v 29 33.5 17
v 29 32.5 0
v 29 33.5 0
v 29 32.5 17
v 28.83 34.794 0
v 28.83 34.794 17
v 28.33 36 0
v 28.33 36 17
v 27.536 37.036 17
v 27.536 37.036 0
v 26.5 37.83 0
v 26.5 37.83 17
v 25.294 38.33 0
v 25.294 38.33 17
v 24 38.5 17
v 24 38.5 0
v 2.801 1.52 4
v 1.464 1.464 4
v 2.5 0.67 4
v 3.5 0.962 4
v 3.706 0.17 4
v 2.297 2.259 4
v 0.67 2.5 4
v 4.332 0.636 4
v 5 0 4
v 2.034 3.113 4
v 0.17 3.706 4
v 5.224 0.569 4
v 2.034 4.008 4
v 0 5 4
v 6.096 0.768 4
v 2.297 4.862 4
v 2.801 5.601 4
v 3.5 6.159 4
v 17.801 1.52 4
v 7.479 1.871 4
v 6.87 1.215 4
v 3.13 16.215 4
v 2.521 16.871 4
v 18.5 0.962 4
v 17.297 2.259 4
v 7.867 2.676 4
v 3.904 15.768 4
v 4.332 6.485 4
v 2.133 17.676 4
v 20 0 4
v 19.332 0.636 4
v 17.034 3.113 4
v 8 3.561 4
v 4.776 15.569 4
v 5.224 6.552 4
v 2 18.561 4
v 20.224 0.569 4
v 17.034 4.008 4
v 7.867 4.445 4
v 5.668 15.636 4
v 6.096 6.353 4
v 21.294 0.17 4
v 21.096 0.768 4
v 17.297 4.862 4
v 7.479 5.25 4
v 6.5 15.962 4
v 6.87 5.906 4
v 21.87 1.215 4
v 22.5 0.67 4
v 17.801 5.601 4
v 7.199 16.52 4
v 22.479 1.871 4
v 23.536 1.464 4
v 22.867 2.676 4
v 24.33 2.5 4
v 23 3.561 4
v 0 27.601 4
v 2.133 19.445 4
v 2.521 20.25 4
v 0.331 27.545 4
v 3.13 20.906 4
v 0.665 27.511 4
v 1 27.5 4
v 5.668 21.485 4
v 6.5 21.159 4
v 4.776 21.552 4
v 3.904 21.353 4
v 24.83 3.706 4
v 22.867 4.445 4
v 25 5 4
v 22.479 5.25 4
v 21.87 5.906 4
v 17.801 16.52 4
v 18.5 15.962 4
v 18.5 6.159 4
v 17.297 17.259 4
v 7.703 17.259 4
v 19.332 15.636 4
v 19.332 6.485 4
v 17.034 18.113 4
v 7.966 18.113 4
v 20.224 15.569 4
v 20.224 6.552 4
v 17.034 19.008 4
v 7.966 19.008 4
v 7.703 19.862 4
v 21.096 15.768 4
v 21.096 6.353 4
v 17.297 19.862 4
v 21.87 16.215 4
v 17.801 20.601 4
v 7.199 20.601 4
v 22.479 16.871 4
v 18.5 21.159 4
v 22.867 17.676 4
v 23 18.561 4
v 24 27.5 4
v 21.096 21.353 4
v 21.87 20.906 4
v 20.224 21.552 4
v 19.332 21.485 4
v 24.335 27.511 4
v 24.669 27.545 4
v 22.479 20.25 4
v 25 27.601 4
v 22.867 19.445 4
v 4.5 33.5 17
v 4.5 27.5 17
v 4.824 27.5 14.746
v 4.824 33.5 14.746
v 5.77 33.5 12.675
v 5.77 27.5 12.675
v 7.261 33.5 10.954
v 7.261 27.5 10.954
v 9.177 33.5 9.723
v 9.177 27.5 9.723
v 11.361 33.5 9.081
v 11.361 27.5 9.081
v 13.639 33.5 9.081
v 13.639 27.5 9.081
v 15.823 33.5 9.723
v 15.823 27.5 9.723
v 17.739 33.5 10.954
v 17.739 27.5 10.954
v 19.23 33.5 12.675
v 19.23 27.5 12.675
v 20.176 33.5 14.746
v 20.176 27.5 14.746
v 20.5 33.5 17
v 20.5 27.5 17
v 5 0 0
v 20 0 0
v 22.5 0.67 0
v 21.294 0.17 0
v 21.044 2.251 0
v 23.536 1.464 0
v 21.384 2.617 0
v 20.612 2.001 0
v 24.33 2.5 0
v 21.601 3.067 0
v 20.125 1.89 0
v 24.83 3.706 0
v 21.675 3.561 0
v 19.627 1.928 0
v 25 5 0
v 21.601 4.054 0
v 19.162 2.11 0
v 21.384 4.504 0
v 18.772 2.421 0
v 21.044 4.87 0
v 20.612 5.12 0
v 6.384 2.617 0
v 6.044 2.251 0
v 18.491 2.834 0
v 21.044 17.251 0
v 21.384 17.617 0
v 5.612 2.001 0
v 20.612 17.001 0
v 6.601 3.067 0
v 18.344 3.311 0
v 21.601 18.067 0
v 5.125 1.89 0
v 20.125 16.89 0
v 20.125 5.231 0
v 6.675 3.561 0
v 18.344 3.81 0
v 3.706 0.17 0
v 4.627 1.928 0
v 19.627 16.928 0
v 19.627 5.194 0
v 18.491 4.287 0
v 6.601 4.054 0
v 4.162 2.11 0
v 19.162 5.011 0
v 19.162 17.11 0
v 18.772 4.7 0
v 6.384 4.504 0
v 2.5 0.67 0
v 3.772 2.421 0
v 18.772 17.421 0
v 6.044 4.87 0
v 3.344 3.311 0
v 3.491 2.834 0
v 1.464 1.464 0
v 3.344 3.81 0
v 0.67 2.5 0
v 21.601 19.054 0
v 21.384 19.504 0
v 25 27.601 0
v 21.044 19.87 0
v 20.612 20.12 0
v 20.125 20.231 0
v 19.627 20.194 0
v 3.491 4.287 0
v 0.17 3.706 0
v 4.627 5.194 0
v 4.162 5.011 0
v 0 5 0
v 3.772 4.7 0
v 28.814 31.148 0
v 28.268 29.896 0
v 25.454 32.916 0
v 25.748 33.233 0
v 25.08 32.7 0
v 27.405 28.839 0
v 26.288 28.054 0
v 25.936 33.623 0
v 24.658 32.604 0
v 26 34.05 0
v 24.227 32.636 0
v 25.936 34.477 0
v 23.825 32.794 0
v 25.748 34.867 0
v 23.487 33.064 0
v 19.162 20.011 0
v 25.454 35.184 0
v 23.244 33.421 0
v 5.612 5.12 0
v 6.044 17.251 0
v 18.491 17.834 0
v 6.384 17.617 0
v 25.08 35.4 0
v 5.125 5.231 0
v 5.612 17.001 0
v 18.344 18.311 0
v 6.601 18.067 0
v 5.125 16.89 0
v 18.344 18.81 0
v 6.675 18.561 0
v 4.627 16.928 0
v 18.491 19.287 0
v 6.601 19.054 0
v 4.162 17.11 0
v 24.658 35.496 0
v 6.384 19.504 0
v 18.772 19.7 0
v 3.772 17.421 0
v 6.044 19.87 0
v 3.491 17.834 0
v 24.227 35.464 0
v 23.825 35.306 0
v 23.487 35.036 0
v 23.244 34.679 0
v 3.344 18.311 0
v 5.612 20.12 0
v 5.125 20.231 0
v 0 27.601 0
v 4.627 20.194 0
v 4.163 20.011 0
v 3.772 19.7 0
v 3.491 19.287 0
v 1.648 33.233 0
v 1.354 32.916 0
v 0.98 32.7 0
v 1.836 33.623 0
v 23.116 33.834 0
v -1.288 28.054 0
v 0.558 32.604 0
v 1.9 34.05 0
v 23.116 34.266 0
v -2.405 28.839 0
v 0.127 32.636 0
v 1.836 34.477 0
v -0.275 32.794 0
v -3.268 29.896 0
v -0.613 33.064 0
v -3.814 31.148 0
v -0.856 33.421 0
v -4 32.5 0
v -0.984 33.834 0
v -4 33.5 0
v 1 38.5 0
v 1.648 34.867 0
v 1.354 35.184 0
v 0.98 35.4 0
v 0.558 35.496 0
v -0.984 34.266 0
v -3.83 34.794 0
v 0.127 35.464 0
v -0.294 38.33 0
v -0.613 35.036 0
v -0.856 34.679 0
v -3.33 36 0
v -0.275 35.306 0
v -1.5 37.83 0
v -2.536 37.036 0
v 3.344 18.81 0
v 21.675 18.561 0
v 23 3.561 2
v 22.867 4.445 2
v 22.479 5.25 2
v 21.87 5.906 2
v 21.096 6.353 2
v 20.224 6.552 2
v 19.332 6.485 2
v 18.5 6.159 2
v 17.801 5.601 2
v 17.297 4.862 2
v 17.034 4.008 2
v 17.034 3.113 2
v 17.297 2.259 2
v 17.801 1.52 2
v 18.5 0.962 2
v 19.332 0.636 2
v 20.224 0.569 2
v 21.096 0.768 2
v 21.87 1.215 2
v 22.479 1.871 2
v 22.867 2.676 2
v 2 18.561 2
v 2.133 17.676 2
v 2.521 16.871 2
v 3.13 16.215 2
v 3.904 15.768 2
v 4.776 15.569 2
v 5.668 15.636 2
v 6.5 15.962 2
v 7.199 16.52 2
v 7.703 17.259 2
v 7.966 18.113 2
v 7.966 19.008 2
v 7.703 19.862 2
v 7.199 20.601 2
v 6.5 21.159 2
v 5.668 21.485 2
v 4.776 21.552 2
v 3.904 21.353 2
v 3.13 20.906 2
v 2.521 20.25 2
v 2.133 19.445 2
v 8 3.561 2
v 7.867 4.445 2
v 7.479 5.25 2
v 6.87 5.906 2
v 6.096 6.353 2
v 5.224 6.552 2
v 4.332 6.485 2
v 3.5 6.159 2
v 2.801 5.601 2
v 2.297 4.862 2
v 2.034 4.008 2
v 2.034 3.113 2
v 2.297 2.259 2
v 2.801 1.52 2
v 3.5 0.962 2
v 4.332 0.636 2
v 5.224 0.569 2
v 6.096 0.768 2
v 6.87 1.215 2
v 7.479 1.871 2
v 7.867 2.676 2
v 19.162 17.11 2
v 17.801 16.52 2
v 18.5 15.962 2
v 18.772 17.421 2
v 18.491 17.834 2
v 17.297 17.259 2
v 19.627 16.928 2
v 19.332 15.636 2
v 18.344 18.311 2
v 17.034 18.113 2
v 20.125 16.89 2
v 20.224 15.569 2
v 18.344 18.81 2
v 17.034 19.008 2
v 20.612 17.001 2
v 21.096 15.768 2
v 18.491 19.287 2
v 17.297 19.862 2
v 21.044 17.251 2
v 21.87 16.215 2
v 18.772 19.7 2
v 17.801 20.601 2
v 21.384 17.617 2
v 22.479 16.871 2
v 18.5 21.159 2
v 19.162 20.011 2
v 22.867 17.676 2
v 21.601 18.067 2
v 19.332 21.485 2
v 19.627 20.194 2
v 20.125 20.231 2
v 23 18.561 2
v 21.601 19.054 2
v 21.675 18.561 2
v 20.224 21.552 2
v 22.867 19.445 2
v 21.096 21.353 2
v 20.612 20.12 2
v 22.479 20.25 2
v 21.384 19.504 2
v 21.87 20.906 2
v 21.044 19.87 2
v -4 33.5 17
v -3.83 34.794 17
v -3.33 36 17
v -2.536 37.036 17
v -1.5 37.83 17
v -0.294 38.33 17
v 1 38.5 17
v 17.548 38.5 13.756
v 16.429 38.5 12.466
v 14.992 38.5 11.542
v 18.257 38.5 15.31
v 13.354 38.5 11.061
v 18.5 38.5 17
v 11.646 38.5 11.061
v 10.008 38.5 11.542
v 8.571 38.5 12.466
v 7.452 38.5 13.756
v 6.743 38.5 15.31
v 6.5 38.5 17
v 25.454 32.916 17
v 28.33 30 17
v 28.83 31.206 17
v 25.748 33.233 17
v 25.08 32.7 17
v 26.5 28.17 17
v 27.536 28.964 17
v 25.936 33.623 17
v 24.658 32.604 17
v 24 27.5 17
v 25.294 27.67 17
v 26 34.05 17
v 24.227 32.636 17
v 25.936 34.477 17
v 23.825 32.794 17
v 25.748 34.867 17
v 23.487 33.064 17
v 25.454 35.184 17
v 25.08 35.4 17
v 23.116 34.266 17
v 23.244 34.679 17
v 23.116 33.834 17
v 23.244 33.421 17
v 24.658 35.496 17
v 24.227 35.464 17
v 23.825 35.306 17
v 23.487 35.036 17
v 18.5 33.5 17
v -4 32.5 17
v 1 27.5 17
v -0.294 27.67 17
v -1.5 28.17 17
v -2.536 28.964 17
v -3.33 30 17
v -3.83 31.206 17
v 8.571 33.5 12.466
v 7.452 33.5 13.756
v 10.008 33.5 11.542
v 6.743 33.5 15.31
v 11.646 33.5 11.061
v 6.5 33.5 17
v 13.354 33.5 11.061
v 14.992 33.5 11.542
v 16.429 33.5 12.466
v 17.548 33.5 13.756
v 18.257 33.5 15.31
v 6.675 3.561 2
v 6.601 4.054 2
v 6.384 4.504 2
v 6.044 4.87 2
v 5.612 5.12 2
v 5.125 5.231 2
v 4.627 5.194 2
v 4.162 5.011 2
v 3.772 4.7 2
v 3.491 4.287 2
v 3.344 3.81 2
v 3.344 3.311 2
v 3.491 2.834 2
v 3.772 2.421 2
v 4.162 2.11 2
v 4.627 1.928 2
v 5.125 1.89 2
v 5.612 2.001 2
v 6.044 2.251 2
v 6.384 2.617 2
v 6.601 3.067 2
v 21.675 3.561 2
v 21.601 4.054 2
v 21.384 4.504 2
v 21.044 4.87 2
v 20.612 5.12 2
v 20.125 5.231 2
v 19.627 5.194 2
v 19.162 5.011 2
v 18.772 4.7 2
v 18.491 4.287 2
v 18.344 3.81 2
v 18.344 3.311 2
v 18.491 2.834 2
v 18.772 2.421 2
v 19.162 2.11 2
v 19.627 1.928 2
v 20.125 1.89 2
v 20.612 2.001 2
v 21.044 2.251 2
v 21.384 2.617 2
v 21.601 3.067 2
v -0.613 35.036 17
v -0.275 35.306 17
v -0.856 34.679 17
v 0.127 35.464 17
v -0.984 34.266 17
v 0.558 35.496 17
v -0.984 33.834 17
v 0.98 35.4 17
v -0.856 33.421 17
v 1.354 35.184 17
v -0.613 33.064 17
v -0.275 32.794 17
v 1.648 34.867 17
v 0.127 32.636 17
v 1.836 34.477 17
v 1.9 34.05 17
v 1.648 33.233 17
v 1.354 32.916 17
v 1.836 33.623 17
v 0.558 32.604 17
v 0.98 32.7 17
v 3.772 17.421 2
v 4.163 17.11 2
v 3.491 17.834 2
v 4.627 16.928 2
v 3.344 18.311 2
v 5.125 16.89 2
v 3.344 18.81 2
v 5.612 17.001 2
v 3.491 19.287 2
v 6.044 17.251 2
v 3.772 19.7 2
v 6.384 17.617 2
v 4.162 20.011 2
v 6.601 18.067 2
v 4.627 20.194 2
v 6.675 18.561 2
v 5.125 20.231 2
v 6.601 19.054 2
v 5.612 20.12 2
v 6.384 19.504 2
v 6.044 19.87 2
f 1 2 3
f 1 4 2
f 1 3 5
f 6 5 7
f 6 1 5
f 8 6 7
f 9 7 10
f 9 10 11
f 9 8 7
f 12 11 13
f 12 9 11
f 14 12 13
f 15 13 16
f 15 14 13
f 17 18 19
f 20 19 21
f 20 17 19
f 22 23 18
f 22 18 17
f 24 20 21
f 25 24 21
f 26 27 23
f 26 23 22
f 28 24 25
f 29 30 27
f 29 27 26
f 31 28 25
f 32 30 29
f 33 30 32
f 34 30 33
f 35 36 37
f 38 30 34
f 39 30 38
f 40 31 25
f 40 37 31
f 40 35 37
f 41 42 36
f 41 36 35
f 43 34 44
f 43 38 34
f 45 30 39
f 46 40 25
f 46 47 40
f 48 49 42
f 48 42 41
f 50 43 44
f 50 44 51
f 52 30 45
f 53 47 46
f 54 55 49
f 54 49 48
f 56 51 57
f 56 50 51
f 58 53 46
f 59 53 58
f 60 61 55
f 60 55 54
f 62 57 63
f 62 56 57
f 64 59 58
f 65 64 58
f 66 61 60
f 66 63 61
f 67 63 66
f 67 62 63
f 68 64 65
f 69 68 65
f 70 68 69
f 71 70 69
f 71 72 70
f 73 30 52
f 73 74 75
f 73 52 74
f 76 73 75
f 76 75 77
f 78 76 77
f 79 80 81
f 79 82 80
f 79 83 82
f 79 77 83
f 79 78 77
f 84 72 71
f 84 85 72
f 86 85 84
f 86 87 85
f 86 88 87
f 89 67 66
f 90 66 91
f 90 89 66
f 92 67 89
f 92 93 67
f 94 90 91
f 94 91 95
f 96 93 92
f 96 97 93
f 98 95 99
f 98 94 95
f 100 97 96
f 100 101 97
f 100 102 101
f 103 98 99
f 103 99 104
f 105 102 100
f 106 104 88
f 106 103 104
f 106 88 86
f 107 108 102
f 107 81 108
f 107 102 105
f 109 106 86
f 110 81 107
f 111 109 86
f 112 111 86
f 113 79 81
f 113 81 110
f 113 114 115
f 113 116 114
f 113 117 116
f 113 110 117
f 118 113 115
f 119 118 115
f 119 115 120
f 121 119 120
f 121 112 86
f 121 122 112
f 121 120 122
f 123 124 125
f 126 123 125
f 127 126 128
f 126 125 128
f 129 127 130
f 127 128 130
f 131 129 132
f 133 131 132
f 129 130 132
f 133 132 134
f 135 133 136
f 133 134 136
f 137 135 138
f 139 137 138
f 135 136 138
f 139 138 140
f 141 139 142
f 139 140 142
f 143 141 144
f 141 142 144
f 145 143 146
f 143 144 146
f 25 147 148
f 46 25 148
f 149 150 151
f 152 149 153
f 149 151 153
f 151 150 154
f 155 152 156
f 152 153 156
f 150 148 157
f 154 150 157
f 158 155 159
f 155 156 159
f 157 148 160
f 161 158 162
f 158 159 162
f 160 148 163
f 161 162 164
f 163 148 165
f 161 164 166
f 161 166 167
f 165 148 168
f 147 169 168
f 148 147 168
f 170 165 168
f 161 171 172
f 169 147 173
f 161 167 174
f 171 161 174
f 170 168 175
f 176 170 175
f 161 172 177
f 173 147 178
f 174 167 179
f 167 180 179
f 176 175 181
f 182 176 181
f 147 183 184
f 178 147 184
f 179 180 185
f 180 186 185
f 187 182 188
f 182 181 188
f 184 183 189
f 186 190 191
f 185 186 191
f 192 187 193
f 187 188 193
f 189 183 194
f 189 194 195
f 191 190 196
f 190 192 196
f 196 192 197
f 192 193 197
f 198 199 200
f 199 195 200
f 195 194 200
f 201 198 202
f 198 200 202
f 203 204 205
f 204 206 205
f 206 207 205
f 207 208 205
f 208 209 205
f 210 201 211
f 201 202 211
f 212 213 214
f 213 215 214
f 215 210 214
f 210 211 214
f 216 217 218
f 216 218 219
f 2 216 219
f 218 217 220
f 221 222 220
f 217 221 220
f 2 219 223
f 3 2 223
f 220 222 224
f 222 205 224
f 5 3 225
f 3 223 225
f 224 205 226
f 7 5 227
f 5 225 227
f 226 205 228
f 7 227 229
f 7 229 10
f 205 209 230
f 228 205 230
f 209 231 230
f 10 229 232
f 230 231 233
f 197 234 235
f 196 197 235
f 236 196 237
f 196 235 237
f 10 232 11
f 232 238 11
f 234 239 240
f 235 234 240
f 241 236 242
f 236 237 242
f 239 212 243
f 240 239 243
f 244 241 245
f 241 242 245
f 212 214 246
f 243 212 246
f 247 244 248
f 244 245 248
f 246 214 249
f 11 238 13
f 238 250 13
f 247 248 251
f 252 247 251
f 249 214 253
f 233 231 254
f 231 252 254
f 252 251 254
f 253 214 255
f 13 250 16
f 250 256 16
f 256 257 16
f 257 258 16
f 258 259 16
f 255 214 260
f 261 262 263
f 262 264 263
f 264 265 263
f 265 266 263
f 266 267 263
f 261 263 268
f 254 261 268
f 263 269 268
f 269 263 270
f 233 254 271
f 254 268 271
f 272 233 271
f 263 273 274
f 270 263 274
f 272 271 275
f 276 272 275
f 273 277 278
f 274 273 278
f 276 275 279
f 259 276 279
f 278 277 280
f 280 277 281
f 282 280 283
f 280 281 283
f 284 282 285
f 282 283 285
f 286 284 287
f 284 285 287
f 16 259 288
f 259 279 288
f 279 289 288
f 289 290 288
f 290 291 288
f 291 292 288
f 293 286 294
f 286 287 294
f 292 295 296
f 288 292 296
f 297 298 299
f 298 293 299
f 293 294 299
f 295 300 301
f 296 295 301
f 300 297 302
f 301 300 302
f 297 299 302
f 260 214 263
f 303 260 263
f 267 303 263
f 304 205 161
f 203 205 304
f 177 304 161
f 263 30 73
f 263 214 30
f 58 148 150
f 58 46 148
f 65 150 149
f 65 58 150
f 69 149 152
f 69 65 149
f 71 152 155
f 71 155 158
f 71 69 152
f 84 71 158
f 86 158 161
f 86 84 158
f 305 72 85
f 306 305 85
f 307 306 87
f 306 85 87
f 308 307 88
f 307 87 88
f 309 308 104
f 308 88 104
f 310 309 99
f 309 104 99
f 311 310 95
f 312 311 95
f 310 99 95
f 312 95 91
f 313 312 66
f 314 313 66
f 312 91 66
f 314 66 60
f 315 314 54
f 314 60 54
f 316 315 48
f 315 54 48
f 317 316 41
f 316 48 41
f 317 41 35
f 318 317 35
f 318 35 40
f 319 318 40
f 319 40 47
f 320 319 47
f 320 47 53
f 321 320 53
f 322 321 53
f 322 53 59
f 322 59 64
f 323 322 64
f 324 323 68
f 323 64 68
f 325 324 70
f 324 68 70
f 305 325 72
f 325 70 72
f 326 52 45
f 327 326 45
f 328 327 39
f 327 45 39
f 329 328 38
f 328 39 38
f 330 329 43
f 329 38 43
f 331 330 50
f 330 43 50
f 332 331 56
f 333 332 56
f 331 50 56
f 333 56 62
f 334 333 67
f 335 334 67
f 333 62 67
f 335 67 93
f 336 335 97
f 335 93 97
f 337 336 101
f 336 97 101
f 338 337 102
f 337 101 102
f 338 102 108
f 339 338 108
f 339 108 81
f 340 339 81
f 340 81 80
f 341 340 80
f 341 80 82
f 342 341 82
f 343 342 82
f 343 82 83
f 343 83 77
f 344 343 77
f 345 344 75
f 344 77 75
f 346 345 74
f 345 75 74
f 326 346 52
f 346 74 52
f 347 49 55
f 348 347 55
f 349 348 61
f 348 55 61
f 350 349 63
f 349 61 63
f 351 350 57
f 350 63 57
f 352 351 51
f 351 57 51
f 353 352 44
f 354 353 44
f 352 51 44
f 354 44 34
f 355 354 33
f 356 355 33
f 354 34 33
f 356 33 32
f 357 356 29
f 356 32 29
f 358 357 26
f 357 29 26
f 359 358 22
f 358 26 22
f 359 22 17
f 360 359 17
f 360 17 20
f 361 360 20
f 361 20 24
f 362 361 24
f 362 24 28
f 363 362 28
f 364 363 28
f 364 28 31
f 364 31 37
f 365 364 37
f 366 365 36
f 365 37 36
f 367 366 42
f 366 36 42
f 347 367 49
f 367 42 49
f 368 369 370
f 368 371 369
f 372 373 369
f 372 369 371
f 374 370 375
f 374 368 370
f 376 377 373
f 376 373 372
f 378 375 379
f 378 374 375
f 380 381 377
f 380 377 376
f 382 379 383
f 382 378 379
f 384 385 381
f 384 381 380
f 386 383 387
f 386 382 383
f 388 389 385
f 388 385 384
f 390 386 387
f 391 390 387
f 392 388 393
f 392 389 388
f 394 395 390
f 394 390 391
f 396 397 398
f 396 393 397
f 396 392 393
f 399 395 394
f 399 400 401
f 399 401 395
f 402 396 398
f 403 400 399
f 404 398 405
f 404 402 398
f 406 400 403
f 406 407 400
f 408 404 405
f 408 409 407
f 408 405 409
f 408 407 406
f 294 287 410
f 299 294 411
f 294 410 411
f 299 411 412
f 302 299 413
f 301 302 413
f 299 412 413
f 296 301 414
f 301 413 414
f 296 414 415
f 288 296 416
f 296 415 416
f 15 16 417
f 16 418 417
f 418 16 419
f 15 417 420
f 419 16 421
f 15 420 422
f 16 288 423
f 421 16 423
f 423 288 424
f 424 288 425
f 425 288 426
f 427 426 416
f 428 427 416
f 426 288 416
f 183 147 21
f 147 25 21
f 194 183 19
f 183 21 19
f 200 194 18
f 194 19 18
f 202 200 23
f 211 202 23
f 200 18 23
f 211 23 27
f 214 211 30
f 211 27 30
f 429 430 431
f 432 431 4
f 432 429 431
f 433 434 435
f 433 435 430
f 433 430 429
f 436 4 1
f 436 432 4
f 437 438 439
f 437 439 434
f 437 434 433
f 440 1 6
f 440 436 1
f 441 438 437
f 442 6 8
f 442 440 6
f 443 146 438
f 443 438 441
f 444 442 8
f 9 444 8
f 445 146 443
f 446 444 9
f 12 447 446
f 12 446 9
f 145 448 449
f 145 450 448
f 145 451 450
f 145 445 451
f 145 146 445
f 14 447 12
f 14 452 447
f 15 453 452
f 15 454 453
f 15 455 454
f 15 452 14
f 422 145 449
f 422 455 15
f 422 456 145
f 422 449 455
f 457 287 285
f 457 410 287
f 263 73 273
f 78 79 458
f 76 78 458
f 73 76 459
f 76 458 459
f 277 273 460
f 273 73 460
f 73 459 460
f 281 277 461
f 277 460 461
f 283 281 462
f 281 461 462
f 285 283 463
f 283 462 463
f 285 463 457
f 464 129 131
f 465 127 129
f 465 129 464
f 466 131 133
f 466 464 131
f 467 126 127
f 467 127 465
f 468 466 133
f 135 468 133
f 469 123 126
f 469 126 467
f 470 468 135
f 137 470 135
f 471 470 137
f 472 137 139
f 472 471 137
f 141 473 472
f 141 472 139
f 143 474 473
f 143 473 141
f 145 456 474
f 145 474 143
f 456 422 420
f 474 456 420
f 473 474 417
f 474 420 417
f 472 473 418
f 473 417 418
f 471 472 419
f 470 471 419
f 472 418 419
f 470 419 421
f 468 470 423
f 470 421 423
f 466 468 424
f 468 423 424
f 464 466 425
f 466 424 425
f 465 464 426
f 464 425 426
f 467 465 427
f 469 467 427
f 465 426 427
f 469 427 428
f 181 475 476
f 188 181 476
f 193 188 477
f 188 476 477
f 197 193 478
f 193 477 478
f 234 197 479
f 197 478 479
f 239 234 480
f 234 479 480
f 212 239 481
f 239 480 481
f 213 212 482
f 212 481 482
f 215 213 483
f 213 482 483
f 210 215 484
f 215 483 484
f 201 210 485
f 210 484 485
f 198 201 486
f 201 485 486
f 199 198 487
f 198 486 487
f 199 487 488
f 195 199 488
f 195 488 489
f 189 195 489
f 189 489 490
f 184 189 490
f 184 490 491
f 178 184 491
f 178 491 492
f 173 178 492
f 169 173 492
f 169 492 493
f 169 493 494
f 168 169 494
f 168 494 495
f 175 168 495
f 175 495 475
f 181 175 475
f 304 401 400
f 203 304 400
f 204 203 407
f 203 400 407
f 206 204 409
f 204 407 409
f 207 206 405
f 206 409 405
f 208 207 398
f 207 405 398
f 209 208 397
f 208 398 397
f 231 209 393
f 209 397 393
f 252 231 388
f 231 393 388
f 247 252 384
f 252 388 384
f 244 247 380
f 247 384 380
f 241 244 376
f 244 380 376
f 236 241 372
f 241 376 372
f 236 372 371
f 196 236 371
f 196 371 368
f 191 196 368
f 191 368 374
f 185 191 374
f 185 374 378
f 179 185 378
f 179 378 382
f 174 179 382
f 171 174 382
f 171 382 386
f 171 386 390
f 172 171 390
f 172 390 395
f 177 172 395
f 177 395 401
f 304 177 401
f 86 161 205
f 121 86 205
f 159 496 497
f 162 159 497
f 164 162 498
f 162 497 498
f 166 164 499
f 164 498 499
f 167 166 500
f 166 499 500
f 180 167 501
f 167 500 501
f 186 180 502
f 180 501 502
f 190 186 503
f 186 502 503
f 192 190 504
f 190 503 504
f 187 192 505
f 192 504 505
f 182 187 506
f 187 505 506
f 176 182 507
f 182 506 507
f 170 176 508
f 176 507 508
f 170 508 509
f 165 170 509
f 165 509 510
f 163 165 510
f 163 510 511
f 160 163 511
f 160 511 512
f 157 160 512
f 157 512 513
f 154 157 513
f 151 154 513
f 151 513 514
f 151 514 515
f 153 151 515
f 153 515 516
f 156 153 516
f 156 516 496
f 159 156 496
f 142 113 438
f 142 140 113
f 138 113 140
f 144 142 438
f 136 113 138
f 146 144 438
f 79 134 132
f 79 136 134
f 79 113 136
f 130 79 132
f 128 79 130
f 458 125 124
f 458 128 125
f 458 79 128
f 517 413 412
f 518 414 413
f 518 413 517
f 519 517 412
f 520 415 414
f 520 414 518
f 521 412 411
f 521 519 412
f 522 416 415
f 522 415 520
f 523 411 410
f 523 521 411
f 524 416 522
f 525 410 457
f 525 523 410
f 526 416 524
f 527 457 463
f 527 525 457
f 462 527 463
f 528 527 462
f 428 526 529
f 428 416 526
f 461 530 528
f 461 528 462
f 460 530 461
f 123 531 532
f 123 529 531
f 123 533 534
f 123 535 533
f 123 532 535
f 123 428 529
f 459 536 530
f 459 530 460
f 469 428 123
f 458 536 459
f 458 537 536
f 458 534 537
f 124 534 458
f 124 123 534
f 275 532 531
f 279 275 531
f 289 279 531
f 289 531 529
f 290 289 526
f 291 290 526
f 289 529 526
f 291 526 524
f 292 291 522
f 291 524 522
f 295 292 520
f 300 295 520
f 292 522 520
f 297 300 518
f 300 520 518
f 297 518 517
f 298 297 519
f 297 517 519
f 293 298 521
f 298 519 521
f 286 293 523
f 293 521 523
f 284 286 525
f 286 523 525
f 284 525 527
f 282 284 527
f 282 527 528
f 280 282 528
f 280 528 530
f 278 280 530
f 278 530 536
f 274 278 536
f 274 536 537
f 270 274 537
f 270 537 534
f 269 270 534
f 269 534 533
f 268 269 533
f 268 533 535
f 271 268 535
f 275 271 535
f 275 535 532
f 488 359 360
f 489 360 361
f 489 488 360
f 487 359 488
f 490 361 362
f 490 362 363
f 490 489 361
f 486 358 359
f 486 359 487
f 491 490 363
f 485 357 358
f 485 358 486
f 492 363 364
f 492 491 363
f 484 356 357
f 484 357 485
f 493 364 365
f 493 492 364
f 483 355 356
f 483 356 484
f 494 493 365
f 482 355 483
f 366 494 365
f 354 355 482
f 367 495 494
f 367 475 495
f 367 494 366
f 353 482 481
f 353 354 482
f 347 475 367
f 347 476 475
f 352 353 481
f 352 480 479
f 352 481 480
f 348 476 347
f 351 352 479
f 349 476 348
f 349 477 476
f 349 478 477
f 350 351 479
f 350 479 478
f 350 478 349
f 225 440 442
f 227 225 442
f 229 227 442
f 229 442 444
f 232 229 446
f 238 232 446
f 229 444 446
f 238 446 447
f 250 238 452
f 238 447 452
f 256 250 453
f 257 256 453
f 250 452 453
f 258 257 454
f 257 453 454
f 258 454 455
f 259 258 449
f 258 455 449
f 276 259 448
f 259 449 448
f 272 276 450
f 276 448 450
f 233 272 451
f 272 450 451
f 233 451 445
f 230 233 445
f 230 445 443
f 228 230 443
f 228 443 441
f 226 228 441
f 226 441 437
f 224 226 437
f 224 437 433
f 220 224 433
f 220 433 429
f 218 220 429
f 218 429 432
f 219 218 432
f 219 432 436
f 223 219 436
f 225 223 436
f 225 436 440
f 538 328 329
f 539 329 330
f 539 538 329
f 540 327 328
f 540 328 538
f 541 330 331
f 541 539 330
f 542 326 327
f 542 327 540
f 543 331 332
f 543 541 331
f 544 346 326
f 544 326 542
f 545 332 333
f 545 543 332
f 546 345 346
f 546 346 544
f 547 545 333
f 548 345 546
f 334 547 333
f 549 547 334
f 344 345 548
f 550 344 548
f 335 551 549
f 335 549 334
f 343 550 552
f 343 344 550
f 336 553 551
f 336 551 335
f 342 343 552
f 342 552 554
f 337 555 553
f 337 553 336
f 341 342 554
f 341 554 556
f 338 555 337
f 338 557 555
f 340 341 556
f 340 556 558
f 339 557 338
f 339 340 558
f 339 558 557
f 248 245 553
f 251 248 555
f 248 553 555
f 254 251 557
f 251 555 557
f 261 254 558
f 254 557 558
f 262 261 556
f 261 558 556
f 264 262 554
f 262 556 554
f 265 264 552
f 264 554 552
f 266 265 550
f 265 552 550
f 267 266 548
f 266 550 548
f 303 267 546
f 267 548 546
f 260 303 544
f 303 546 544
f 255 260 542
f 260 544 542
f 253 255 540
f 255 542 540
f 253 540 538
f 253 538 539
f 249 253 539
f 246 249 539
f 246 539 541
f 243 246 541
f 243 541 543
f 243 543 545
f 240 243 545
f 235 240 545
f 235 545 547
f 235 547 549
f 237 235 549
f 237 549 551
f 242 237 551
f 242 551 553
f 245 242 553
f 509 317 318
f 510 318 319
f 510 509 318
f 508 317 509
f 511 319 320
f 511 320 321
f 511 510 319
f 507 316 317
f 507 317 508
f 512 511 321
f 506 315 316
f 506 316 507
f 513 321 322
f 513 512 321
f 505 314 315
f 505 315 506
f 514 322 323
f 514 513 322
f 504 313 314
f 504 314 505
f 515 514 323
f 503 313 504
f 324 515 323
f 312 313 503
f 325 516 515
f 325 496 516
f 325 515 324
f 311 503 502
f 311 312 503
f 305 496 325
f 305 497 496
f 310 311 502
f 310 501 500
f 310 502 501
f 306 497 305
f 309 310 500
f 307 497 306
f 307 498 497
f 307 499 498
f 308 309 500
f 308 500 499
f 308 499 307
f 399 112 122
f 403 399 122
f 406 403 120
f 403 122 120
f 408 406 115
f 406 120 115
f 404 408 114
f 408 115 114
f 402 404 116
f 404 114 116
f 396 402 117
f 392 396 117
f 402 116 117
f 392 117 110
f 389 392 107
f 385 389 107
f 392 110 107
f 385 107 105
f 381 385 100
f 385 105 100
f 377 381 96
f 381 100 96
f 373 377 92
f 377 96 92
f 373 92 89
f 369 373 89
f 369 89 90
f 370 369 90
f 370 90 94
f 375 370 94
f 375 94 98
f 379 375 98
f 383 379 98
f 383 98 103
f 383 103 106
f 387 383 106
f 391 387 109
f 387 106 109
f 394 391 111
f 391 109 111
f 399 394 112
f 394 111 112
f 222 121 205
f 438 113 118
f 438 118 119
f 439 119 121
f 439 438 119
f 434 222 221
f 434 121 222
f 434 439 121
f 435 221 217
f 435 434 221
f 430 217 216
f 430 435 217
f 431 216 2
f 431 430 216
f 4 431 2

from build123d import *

# Parameters (mm, degrees)
F0_W      = 25
F0_H      = 38.5
F1_DEPTH  = 4
F2_R      = 1.675
F3_DEPTH  = 25
F4_W      = 25
F4_H      = 11
F5_DEPTH  = 13
F7_DEPTH  = 6
F8_R      = 8
F9_DEPTH  = 6
F2_R_2    = 3
F10_DEPTH = 2
F11_W     = 11
F11_H     = 17
F12_DEPTH = 4
F13_R     = 5
F14_W     = 11
F14_H     = 17
F15_DEPTH = 4
F16_DEPTH = 2
F17_R     = 1.45
F18_DEPTH = 25
F19_R     = 5
F20_DEPTH = 25


with BuildPart() as f1:
    # F0 (on Top) → F1 (new body)
    with BuildSketch(Plane.XY):
        with Locations((12.5, 19.25)):
            Rectangle(F0_W, F0_H)
    extrude(amount=F1_DEPTH)

    # F2 (on face) → F3 (cut)
    with BuildSketch(Plane.XY.offset(4)):
        with BuildLine():
            ThreePointArc((3.325, 18.5605346784), (5, 16.8855346784), (6.675, 18.5605346784))
            ThreePointArc((6.675, 18.5605346784), (5, 20.2355346784), (3.325, 18.5605346784))
        make_face()
        with Locations((20, 18.5605346784)):
            Circle(F2_R)
        with Locations((20, 3.5605346784)):
            Circle(F2_R)
        with Locations((5, 3.5605346784)):
            Circle(F2_R)
    extrude(amount=-F3_DEPTH, mode=Mode.SUBTRACT)

    # F4 (on face) → F5 (join)
    with BuildSketch(Plane.XY.offset(4)):
        with Locations((12.5, 33)):
            Rectangle(F4_W, F4_H)
    extrude(amount=F5_DEPTH)

    # F6 (on face) → F7 (cut)
    with BuildSketch(Plane(origin=(0, 38.5, 0), x_dir=(-1, 0, 0), z_dir=(0, 1, 0))):
        with BuildLine():
            ThreePointArc((-18.5, 17), (-12.5, 11), (-6.5, 17))
            Line((-6.5, 17), (-18.5, 17))
        make_face()
    extrude(amount=-F7_DEPTH, mode=Mode.SUBTRACT)

    # F8 (on face) → F9 (cut)
    with BuildSketch(Plane.XZ.offset(-27.5)):
        with Locations((12.5, 17)):
            Circle(F8_R)
    extrude(amount=-F9_DEPTH, mode=Mode.SUBTRACT)

    # F2 (on face) → F10 (cut)
    with BuildSketch(Plane.XY.offset(4)):
        with BuildLine():
            ThreePointArc((8, 18.5605346784), (5, 21.5605346784), (2, 18.5605346784))
            ThreePointArc((2, 18.5605346784), (5, 15.5605346784), (8, 18.5605346784))
        make_face()
        with BuildLine():
            ThreePointArc((3.325, 18.5605346784), (5, 20.2355346784), (6.675, 18.5605346784))
            ThreePointArc((6.675, 18.5605346784), (5, 16.8855346784), (3.325, 18.5605346784))
        make_face(mode=Mode.SUBTRACT)
        with Locations((20, 18.5605346784)):
            Circle(F2_R_2)
        with Locations((20, 18.5605346784)):
            Circle(F2_R, mode=Mode.SUBTRACT)
        with Locations((20, 3.5605346784)):
            Circle(F2_R_2)
        with Locations((20, 3.5605346784)):
            Circle(F2_R, mode=Mode.SUBTRACT)
        with Locations((5, 3.5605346784)):
            Circle(F2_R_2)
        with Locations((5, 3.5605346784)):
            Circle(F2_R, mode=Mode.SUBTRACT)
    extrude(amount=-F10_DEPTH, mode=Mode.SUBTRACT)

    # F11 (on face) → F12 (join)
    with BuildSketch(Plane(origin=(0, 0, 0), x_dir=(0, -1, 0), z_dir=(-1, 0, 0))):
        with Locations((-33, 8.5)):
            Rectangle(F11_W, F11_H)
    extrude(amount=F12_DEPTH)

    # F13
    f13_edges = [f1.edges().sort_by_distance(p)[0] for p in [
        (0, 0, 2),
        (25, 0, 2),
    ]]
    fillet(f13_edges, radius=F13_R)

    # F14 (on face) → F15 (join)
    with BuildSketch(Plane.YZ.offset(25)):
        with Locations((33, 8.5)):
            Rectangle(F14_W, F14_H)
    extrude(amount=F15_DEPTH)

    # F14 (on face) → F16 (join)
    with BuildSketch(Plane.YZ.offset(25)):
        with Locations((33, 8.5)):
            Rectangle(F14_W, F14_H)
    extrude(amount=F16_DEPTH)

    # F17 (on face) → F18 (cut)
    with BuildSketch(Plane.XY.offset(17)):
        with Locations((0.45, 34.05)):
            Circle(F17_R)
        with Locations((24.55, 34.05)):
            Circle(F17_R)
    extrude(amount=-F18_DEPTH, mode=Mode.SUBTRACT)

    # F19
    f19_edges = [f1.edges().sort_by_distance(p)[0] for p in [
        (-4, 38.5, 8.5),
        (-4, 27.5, 8.5),
        (29, 27.5, 8.5),
        (29, 38.5, 8.5),
    ]]
    fillet(f19_edges, radius=F19_R)

    # F2 (on face) → F20 (cut)
    with BuildSketch(Plane.XY.offset(4)):
        with BuildLine():
            ThreePointArc((8, 18.5605346784), (5, 21.5605346784), (2, 18.5605346784))
            ThreePointArc((2, 18.5605346784), (5, 15.5605346784), (8, 18.5605346784))
        make_face()
        with BuildLine():
            ThreePointArc((3.325, 18.5605346784), (5, 20.2355346784), (6.675, 18.5605346784))
            ThreePointArc((6.675, 18.5605346784), (5, 16.8855346784), (3.325, 18.5605346784))
        make_face(mode=Mode.SUBTRACT)
        with Locations((20, 18.5605346784)):
            Circle(F2_R_2)
        with Locations((20, 18.5605346784)):
            Circle(F2_R, mode=Mode.SUBTRACT)
        with BuildLine():
            ThreePointArc((3.325, 18.5605346784), (5, 16.8855346784), (6.675, 18.5605346784))
            ThreePointArc((6.675, 18.5605346784), (5, 20.2355346784), (3.325, 18.5605346784))
        make_face()
        with Locations((20, 18.5605346784)):
            Circle(F2_R)
    extrude(amount=F20_DEPTH, mode=Mode.SUBTRACT)


solid = f1.part
